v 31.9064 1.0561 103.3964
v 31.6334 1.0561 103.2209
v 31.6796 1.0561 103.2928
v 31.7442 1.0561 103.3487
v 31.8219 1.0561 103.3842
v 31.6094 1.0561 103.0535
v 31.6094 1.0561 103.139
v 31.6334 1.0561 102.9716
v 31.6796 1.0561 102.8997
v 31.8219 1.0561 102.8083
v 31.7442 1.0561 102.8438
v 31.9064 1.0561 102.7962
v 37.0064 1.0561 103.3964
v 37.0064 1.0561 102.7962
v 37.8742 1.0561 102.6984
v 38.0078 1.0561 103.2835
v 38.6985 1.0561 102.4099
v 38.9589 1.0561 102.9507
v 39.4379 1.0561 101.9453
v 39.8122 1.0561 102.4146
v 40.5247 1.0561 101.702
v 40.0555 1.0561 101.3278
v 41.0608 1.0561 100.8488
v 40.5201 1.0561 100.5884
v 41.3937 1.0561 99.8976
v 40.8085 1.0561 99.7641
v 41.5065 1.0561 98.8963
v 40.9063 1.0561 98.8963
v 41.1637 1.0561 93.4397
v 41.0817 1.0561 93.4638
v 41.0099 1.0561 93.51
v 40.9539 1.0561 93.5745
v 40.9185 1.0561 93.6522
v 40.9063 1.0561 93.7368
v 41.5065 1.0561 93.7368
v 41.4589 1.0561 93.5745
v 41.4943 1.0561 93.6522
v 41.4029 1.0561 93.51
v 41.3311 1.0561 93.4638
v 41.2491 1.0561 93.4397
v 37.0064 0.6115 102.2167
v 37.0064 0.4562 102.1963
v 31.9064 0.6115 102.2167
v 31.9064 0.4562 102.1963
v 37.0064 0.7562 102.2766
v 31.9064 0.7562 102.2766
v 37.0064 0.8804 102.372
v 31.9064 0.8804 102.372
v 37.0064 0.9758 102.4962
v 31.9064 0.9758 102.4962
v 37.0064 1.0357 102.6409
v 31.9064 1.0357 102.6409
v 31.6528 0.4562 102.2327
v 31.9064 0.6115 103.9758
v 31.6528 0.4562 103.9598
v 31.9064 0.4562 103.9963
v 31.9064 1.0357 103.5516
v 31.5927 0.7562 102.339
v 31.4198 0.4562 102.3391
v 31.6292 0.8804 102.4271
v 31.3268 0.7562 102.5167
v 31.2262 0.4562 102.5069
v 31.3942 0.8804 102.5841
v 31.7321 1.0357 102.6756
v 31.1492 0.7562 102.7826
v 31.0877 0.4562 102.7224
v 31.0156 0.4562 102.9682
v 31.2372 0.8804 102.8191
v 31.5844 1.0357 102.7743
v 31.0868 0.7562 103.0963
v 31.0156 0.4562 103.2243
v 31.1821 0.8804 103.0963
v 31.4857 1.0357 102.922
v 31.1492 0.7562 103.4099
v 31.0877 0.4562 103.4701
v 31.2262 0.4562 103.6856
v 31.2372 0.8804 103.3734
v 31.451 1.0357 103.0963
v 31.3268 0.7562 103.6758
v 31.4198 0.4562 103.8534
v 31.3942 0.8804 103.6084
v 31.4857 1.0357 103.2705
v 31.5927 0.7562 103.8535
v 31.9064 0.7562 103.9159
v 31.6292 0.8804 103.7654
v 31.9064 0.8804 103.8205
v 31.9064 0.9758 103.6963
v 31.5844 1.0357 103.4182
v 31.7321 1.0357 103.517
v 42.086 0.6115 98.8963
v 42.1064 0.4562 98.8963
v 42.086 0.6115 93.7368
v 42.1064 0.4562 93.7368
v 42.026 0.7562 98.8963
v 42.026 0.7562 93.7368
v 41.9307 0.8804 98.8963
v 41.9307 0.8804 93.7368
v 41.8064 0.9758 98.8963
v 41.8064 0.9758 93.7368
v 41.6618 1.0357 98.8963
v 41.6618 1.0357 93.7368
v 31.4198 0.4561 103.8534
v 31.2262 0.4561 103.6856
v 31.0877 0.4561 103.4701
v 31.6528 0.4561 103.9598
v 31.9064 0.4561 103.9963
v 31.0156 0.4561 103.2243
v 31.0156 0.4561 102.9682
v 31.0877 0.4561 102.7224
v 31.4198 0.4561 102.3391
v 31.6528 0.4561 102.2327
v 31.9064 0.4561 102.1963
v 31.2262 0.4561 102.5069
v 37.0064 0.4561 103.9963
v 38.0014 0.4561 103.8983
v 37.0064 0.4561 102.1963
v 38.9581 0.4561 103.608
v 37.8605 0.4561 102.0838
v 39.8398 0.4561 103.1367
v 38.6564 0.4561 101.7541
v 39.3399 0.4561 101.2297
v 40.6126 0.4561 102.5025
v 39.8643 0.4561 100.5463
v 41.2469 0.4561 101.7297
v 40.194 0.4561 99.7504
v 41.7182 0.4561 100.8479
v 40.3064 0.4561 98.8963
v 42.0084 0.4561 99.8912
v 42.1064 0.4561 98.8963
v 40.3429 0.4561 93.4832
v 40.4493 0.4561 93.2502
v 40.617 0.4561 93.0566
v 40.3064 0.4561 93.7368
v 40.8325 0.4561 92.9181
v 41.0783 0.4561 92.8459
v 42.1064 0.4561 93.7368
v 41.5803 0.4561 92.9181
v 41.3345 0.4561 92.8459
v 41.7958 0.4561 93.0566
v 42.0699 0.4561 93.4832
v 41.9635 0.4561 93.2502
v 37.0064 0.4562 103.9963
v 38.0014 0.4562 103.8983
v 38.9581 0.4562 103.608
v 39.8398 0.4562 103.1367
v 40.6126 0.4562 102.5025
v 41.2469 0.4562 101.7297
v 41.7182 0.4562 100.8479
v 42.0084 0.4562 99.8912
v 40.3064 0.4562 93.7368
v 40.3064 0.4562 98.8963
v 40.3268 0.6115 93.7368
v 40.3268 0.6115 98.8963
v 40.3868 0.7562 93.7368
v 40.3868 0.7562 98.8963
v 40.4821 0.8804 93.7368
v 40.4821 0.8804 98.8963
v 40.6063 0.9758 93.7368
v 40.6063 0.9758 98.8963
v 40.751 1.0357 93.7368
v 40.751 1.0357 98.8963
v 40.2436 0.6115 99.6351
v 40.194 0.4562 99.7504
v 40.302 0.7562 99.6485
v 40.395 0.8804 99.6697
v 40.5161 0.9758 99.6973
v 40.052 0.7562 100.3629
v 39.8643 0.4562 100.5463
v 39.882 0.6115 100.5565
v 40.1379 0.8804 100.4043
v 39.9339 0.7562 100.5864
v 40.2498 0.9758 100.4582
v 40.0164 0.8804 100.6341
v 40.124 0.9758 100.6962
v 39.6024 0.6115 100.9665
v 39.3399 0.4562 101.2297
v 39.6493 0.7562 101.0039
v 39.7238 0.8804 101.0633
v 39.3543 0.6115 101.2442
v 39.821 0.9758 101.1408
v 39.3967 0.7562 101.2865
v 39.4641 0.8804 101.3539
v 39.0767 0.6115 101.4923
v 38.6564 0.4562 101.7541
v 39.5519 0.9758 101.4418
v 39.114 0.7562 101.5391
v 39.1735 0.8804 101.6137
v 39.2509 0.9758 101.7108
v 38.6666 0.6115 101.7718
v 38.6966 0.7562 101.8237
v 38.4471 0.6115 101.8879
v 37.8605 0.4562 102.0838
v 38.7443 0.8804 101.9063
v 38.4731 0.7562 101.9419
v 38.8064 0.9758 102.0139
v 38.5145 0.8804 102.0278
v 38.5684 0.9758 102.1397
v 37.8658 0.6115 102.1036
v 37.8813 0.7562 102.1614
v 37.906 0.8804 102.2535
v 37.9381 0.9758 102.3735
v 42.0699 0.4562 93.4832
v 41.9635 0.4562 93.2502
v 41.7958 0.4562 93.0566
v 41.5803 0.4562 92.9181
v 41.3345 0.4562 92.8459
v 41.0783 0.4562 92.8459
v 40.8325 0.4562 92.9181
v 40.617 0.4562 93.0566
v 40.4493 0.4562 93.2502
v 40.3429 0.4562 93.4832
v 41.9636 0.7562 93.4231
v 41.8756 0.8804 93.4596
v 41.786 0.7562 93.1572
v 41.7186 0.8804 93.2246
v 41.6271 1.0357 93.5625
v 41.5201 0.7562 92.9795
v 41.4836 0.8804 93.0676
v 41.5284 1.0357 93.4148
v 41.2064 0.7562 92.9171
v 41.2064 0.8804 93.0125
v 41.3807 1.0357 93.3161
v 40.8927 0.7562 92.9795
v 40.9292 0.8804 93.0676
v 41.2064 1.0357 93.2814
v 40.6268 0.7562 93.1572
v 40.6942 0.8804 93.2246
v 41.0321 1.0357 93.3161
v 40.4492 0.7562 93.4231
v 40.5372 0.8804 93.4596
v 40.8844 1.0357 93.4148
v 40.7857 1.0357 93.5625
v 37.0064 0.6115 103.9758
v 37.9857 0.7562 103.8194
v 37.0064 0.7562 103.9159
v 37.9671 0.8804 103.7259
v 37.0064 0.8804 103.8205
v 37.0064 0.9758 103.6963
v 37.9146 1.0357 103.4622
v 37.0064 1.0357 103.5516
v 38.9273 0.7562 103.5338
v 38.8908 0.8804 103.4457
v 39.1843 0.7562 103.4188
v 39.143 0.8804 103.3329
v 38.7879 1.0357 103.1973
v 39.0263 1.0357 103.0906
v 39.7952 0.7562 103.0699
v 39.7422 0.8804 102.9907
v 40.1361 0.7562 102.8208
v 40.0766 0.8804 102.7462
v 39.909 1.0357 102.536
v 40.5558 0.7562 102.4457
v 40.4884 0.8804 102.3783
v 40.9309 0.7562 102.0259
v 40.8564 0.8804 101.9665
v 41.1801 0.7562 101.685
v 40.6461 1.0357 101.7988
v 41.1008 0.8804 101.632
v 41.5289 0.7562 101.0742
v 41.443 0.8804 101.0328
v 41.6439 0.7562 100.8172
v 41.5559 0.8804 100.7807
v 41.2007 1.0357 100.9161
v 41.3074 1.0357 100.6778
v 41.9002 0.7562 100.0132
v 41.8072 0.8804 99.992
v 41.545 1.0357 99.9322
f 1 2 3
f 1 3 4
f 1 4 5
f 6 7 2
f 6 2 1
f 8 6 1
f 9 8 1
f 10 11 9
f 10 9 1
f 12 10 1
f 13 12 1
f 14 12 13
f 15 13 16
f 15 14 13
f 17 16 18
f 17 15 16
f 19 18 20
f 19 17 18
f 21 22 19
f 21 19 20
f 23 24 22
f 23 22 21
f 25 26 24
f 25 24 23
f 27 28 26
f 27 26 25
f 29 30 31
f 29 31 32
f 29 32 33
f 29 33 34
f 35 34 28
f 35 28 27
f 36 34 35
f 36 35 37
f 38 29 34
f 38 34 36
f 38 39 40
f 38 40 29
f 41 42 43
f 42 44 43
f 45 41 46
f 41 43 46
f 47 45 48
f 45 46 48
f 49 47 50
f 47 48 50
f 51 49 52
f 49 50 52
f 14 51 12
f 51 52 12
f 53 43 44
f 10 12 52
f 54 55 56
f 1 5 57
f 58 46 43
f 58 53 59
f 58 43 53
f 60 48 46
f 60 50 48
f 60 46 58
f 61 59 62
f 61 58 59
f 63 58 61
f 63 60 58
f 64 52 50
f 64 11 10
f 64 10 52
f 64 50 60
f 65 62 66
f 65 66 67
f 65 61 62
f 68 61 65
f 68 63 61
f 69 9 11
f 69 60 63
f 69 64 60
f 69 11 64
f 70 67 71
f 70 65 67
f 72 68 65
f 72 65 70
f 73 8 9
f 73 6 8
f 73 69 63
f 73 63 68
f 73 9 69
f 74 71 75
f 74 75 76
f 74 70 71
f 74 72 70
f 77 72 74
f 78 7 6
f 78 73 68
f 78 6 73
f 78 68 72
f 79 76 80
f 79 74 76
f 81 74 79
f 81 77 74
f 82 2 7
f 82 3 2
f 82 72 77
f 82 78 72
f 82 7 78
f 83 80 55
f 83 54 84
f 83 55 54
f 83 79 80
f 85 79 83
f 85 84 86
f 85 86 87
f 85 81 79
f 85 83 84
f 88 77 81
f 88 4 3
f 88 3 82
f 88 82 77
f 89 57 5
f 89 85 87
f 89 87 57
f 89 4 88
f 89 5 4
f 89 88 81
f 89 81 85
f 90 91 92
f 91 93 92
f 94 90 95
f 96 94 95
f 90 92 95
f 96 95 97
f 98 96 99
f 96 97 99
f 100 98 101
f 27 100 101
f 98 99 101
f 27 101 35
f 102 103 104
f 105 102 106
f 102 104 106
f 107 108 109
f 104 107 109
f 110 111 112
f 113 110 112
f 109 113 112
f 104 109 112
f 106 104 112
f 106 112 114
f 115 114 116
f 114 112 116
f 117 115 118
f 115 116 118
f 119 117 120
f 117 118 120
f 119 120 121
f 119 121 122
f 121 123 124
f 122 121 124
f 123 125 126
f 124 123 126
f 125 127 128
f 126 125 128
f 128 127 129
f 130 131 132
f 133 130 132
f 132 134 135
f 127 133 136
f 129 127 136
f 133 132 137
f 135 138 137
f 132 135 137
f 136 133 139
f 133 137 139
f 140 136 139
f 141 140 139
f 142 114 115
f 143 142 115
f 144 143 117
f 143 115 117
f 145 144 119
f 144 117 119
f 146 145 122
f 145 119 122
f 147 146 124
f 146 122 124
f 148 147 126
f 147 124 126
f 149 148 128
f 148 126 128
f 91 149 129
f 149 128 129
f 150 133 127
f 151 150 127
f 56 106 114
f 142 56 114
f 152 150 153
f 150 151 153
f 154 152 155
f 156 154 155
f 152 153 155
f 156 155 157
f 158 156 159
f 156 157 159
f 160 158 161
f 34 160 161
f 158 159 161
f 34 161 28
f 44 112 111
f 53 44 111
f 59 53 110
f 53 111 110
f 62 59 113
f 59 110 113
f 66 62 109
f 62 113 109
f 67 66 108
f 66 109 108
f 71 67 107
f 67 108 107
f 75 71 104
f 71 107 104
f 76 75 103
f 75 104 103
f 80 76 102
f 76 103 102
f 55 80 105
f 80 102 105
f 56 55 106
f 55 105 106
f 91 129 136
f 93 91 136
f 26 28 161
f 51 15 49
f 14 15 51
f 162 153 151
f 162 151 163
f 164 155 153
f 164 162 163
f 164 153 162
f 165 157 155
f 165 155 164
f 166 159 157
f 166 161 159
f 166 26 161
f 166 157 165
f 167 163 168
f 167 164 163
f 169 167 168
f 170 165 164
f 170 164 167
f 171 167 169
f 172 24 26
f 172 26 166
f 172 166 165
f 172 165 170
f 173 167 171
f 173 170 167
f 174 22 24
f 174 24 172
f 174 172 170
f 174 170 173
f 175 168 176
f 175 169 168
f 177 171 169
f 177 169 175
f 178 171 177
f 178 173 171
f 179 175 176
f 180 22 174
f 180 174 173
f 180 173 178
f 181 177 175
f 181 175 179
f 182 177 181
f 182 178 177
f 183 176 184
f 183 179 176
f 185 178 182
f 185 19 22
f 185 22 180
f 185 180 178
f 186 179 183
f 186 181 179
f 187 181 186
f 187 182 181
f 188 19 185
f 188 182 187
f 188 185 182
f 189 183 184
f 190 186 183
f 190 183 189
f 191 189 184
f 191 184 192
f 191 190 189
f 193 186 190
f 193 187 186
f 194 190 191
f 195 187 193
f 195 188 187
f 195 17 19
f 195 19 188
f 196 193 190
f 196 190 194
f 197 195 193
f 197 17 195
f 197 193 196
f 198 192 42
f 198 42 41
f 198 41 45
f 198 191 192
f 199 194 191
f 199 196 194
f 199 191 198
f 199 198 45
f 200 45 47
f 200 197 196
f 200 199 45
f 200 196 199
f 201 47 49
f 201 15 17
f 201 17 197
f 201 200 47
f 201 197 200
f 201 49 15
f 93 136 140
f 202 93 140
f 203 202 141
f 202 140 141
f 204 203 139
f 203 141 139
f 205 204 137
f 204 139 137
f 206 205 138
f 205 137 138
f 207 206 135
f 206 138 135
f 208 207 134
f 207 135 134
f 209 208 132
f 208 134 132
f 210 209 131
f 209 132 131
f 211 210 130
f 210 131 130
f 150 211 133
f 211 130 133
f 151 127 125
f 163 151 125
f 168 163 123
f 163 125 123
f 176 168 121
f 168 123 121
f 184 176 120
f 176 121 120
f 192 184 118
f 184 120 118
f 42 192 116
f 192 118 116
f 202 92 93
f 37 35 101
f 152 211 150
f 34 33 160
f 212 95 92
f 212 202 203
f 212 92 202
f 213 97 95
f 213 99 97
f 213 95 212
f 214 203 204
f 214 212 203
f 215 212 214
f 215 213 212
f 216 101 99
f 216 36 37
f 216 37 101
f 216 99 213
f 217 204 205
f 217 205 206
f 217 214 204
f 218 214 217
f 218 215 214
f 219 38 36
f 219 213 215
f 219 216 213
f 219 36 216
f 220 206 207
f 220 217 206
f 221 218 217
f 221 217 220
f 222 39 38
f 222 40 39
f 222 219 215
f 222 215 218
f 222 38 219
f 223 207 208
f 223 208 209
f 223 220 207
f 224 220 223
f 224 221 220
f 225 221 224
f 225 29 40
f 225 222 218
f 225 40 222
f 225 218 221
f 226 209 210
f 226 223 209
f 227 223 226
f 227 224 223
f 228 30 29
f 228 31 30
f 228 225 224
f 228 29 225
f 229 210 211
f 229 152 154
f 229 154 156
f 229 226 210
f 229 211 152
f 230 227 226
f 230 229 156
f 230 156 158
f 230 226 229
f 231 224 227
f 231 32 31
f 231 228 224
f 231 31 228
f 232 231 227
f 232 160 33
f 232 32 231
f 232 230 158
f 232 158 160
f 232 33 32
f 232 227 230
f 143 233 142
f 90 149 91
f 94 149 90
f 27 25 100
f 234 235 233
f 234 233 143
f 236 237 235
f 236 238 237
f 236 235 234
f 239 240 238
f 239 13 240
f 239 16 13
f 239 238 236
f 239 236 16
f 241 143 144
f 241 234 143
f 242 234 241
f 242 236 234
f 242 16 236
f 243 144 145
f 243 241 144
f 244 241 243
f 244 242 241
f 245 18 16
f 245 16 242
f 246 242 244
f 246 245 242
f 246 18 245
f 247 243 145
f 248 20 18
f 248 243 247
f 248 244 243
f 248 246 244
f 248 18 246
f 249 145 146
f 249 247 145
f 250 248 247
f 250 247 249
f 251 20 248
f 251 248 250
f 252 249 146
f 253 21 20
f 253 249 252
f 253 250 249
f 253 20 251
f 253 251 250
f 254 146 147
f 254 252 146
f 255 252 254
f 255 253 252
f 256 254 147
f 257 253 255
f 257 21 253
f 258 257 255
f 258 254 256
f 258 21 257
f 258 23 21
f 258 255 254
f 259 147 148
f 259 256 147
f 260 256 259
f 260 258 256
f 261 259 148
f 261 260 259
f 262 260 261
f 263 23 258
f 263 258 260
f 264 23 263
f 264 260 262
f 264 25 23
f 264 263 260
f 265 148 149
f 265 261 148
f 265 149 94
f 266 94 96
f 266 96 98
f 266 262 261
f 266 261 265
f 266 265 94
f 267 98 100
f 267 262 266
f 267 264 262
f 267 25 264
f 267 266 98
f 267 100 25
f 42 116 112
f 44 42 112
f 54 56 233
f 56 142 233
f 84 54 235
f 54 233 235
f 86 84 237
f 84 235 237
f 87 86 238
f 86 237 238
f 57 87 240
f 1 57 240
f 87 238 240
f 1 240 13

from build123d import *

# Parameters (mm, degrees)
SALIENTE_EXTRUIR1_DEPTH = 0.6
REDONDEO1_R             = 0.6


with BuildPart() as part:
    # Croquis1 → Saliente-Extruir1 (new body)
    with BuildSketch(Plane(origin=(0, 0.456148123, 0), x_dir=(1, 0, 0), z_dir=(0, 1, 0))):
        with BuildLine():
            Line((31.906397954, -103.996253755), (37.006397954, -103.996253755))
            ThreePointArc((37.006397954, -103.996253755), (40.612642538, -102.502498339), (42.106397954, -98.896253755))
            Line((42.106397954, -98.896253755), (42.106397954, -93.736756225))
            ThreePointArc((42.106397954, -93.736756225), (41.206397954, -92.836756225), (40.306397954, -93.736756225))
            Line((40.306397954, -93.736756225), (40.306397954, -98.896253755))
            ThreePointArc((40.306397954, -98.896253755), (39.339850332, -101.229706133), (37.006397954, -102.196253755))
            Line((37.006397954, -102.196253755), (31.906397954, -102.196253755))
            ThreePointArc((31.906397954, -102.196253755), (31.006397954, -103.096253755), (31.906397954, -103.996253755))
        make_face()
    extrude(amount=SALIENTE_EXTRUIR1_DEPTH)

    # Redondeo1
    redondeo1_edges = [part.edges().sort_by_distance(p)[0] for p in [
        (40.306397954, 1.056148123, 96.31650499),
        (39.339850332, 1.056148123, 101.229706133),
        (42.106397954, 1.056148123, 96.31650499),
        (40.612642538, 1.056148123, 102.502498339),
        (41.206397954, 1.056148123, 92.836756225),
        (34.456397954, 1.056148123, 102.196253755),
        (31.006397954, 1.056148123, 103.096253755),
        (34.456397954, 1.056148123, 103.996253755),
    ]]
    fillet(redondeo1_edges, radius=REDONDEO1_R - 0.0001)  # a hair under: the kernel refuses the full size


solid = part.part
